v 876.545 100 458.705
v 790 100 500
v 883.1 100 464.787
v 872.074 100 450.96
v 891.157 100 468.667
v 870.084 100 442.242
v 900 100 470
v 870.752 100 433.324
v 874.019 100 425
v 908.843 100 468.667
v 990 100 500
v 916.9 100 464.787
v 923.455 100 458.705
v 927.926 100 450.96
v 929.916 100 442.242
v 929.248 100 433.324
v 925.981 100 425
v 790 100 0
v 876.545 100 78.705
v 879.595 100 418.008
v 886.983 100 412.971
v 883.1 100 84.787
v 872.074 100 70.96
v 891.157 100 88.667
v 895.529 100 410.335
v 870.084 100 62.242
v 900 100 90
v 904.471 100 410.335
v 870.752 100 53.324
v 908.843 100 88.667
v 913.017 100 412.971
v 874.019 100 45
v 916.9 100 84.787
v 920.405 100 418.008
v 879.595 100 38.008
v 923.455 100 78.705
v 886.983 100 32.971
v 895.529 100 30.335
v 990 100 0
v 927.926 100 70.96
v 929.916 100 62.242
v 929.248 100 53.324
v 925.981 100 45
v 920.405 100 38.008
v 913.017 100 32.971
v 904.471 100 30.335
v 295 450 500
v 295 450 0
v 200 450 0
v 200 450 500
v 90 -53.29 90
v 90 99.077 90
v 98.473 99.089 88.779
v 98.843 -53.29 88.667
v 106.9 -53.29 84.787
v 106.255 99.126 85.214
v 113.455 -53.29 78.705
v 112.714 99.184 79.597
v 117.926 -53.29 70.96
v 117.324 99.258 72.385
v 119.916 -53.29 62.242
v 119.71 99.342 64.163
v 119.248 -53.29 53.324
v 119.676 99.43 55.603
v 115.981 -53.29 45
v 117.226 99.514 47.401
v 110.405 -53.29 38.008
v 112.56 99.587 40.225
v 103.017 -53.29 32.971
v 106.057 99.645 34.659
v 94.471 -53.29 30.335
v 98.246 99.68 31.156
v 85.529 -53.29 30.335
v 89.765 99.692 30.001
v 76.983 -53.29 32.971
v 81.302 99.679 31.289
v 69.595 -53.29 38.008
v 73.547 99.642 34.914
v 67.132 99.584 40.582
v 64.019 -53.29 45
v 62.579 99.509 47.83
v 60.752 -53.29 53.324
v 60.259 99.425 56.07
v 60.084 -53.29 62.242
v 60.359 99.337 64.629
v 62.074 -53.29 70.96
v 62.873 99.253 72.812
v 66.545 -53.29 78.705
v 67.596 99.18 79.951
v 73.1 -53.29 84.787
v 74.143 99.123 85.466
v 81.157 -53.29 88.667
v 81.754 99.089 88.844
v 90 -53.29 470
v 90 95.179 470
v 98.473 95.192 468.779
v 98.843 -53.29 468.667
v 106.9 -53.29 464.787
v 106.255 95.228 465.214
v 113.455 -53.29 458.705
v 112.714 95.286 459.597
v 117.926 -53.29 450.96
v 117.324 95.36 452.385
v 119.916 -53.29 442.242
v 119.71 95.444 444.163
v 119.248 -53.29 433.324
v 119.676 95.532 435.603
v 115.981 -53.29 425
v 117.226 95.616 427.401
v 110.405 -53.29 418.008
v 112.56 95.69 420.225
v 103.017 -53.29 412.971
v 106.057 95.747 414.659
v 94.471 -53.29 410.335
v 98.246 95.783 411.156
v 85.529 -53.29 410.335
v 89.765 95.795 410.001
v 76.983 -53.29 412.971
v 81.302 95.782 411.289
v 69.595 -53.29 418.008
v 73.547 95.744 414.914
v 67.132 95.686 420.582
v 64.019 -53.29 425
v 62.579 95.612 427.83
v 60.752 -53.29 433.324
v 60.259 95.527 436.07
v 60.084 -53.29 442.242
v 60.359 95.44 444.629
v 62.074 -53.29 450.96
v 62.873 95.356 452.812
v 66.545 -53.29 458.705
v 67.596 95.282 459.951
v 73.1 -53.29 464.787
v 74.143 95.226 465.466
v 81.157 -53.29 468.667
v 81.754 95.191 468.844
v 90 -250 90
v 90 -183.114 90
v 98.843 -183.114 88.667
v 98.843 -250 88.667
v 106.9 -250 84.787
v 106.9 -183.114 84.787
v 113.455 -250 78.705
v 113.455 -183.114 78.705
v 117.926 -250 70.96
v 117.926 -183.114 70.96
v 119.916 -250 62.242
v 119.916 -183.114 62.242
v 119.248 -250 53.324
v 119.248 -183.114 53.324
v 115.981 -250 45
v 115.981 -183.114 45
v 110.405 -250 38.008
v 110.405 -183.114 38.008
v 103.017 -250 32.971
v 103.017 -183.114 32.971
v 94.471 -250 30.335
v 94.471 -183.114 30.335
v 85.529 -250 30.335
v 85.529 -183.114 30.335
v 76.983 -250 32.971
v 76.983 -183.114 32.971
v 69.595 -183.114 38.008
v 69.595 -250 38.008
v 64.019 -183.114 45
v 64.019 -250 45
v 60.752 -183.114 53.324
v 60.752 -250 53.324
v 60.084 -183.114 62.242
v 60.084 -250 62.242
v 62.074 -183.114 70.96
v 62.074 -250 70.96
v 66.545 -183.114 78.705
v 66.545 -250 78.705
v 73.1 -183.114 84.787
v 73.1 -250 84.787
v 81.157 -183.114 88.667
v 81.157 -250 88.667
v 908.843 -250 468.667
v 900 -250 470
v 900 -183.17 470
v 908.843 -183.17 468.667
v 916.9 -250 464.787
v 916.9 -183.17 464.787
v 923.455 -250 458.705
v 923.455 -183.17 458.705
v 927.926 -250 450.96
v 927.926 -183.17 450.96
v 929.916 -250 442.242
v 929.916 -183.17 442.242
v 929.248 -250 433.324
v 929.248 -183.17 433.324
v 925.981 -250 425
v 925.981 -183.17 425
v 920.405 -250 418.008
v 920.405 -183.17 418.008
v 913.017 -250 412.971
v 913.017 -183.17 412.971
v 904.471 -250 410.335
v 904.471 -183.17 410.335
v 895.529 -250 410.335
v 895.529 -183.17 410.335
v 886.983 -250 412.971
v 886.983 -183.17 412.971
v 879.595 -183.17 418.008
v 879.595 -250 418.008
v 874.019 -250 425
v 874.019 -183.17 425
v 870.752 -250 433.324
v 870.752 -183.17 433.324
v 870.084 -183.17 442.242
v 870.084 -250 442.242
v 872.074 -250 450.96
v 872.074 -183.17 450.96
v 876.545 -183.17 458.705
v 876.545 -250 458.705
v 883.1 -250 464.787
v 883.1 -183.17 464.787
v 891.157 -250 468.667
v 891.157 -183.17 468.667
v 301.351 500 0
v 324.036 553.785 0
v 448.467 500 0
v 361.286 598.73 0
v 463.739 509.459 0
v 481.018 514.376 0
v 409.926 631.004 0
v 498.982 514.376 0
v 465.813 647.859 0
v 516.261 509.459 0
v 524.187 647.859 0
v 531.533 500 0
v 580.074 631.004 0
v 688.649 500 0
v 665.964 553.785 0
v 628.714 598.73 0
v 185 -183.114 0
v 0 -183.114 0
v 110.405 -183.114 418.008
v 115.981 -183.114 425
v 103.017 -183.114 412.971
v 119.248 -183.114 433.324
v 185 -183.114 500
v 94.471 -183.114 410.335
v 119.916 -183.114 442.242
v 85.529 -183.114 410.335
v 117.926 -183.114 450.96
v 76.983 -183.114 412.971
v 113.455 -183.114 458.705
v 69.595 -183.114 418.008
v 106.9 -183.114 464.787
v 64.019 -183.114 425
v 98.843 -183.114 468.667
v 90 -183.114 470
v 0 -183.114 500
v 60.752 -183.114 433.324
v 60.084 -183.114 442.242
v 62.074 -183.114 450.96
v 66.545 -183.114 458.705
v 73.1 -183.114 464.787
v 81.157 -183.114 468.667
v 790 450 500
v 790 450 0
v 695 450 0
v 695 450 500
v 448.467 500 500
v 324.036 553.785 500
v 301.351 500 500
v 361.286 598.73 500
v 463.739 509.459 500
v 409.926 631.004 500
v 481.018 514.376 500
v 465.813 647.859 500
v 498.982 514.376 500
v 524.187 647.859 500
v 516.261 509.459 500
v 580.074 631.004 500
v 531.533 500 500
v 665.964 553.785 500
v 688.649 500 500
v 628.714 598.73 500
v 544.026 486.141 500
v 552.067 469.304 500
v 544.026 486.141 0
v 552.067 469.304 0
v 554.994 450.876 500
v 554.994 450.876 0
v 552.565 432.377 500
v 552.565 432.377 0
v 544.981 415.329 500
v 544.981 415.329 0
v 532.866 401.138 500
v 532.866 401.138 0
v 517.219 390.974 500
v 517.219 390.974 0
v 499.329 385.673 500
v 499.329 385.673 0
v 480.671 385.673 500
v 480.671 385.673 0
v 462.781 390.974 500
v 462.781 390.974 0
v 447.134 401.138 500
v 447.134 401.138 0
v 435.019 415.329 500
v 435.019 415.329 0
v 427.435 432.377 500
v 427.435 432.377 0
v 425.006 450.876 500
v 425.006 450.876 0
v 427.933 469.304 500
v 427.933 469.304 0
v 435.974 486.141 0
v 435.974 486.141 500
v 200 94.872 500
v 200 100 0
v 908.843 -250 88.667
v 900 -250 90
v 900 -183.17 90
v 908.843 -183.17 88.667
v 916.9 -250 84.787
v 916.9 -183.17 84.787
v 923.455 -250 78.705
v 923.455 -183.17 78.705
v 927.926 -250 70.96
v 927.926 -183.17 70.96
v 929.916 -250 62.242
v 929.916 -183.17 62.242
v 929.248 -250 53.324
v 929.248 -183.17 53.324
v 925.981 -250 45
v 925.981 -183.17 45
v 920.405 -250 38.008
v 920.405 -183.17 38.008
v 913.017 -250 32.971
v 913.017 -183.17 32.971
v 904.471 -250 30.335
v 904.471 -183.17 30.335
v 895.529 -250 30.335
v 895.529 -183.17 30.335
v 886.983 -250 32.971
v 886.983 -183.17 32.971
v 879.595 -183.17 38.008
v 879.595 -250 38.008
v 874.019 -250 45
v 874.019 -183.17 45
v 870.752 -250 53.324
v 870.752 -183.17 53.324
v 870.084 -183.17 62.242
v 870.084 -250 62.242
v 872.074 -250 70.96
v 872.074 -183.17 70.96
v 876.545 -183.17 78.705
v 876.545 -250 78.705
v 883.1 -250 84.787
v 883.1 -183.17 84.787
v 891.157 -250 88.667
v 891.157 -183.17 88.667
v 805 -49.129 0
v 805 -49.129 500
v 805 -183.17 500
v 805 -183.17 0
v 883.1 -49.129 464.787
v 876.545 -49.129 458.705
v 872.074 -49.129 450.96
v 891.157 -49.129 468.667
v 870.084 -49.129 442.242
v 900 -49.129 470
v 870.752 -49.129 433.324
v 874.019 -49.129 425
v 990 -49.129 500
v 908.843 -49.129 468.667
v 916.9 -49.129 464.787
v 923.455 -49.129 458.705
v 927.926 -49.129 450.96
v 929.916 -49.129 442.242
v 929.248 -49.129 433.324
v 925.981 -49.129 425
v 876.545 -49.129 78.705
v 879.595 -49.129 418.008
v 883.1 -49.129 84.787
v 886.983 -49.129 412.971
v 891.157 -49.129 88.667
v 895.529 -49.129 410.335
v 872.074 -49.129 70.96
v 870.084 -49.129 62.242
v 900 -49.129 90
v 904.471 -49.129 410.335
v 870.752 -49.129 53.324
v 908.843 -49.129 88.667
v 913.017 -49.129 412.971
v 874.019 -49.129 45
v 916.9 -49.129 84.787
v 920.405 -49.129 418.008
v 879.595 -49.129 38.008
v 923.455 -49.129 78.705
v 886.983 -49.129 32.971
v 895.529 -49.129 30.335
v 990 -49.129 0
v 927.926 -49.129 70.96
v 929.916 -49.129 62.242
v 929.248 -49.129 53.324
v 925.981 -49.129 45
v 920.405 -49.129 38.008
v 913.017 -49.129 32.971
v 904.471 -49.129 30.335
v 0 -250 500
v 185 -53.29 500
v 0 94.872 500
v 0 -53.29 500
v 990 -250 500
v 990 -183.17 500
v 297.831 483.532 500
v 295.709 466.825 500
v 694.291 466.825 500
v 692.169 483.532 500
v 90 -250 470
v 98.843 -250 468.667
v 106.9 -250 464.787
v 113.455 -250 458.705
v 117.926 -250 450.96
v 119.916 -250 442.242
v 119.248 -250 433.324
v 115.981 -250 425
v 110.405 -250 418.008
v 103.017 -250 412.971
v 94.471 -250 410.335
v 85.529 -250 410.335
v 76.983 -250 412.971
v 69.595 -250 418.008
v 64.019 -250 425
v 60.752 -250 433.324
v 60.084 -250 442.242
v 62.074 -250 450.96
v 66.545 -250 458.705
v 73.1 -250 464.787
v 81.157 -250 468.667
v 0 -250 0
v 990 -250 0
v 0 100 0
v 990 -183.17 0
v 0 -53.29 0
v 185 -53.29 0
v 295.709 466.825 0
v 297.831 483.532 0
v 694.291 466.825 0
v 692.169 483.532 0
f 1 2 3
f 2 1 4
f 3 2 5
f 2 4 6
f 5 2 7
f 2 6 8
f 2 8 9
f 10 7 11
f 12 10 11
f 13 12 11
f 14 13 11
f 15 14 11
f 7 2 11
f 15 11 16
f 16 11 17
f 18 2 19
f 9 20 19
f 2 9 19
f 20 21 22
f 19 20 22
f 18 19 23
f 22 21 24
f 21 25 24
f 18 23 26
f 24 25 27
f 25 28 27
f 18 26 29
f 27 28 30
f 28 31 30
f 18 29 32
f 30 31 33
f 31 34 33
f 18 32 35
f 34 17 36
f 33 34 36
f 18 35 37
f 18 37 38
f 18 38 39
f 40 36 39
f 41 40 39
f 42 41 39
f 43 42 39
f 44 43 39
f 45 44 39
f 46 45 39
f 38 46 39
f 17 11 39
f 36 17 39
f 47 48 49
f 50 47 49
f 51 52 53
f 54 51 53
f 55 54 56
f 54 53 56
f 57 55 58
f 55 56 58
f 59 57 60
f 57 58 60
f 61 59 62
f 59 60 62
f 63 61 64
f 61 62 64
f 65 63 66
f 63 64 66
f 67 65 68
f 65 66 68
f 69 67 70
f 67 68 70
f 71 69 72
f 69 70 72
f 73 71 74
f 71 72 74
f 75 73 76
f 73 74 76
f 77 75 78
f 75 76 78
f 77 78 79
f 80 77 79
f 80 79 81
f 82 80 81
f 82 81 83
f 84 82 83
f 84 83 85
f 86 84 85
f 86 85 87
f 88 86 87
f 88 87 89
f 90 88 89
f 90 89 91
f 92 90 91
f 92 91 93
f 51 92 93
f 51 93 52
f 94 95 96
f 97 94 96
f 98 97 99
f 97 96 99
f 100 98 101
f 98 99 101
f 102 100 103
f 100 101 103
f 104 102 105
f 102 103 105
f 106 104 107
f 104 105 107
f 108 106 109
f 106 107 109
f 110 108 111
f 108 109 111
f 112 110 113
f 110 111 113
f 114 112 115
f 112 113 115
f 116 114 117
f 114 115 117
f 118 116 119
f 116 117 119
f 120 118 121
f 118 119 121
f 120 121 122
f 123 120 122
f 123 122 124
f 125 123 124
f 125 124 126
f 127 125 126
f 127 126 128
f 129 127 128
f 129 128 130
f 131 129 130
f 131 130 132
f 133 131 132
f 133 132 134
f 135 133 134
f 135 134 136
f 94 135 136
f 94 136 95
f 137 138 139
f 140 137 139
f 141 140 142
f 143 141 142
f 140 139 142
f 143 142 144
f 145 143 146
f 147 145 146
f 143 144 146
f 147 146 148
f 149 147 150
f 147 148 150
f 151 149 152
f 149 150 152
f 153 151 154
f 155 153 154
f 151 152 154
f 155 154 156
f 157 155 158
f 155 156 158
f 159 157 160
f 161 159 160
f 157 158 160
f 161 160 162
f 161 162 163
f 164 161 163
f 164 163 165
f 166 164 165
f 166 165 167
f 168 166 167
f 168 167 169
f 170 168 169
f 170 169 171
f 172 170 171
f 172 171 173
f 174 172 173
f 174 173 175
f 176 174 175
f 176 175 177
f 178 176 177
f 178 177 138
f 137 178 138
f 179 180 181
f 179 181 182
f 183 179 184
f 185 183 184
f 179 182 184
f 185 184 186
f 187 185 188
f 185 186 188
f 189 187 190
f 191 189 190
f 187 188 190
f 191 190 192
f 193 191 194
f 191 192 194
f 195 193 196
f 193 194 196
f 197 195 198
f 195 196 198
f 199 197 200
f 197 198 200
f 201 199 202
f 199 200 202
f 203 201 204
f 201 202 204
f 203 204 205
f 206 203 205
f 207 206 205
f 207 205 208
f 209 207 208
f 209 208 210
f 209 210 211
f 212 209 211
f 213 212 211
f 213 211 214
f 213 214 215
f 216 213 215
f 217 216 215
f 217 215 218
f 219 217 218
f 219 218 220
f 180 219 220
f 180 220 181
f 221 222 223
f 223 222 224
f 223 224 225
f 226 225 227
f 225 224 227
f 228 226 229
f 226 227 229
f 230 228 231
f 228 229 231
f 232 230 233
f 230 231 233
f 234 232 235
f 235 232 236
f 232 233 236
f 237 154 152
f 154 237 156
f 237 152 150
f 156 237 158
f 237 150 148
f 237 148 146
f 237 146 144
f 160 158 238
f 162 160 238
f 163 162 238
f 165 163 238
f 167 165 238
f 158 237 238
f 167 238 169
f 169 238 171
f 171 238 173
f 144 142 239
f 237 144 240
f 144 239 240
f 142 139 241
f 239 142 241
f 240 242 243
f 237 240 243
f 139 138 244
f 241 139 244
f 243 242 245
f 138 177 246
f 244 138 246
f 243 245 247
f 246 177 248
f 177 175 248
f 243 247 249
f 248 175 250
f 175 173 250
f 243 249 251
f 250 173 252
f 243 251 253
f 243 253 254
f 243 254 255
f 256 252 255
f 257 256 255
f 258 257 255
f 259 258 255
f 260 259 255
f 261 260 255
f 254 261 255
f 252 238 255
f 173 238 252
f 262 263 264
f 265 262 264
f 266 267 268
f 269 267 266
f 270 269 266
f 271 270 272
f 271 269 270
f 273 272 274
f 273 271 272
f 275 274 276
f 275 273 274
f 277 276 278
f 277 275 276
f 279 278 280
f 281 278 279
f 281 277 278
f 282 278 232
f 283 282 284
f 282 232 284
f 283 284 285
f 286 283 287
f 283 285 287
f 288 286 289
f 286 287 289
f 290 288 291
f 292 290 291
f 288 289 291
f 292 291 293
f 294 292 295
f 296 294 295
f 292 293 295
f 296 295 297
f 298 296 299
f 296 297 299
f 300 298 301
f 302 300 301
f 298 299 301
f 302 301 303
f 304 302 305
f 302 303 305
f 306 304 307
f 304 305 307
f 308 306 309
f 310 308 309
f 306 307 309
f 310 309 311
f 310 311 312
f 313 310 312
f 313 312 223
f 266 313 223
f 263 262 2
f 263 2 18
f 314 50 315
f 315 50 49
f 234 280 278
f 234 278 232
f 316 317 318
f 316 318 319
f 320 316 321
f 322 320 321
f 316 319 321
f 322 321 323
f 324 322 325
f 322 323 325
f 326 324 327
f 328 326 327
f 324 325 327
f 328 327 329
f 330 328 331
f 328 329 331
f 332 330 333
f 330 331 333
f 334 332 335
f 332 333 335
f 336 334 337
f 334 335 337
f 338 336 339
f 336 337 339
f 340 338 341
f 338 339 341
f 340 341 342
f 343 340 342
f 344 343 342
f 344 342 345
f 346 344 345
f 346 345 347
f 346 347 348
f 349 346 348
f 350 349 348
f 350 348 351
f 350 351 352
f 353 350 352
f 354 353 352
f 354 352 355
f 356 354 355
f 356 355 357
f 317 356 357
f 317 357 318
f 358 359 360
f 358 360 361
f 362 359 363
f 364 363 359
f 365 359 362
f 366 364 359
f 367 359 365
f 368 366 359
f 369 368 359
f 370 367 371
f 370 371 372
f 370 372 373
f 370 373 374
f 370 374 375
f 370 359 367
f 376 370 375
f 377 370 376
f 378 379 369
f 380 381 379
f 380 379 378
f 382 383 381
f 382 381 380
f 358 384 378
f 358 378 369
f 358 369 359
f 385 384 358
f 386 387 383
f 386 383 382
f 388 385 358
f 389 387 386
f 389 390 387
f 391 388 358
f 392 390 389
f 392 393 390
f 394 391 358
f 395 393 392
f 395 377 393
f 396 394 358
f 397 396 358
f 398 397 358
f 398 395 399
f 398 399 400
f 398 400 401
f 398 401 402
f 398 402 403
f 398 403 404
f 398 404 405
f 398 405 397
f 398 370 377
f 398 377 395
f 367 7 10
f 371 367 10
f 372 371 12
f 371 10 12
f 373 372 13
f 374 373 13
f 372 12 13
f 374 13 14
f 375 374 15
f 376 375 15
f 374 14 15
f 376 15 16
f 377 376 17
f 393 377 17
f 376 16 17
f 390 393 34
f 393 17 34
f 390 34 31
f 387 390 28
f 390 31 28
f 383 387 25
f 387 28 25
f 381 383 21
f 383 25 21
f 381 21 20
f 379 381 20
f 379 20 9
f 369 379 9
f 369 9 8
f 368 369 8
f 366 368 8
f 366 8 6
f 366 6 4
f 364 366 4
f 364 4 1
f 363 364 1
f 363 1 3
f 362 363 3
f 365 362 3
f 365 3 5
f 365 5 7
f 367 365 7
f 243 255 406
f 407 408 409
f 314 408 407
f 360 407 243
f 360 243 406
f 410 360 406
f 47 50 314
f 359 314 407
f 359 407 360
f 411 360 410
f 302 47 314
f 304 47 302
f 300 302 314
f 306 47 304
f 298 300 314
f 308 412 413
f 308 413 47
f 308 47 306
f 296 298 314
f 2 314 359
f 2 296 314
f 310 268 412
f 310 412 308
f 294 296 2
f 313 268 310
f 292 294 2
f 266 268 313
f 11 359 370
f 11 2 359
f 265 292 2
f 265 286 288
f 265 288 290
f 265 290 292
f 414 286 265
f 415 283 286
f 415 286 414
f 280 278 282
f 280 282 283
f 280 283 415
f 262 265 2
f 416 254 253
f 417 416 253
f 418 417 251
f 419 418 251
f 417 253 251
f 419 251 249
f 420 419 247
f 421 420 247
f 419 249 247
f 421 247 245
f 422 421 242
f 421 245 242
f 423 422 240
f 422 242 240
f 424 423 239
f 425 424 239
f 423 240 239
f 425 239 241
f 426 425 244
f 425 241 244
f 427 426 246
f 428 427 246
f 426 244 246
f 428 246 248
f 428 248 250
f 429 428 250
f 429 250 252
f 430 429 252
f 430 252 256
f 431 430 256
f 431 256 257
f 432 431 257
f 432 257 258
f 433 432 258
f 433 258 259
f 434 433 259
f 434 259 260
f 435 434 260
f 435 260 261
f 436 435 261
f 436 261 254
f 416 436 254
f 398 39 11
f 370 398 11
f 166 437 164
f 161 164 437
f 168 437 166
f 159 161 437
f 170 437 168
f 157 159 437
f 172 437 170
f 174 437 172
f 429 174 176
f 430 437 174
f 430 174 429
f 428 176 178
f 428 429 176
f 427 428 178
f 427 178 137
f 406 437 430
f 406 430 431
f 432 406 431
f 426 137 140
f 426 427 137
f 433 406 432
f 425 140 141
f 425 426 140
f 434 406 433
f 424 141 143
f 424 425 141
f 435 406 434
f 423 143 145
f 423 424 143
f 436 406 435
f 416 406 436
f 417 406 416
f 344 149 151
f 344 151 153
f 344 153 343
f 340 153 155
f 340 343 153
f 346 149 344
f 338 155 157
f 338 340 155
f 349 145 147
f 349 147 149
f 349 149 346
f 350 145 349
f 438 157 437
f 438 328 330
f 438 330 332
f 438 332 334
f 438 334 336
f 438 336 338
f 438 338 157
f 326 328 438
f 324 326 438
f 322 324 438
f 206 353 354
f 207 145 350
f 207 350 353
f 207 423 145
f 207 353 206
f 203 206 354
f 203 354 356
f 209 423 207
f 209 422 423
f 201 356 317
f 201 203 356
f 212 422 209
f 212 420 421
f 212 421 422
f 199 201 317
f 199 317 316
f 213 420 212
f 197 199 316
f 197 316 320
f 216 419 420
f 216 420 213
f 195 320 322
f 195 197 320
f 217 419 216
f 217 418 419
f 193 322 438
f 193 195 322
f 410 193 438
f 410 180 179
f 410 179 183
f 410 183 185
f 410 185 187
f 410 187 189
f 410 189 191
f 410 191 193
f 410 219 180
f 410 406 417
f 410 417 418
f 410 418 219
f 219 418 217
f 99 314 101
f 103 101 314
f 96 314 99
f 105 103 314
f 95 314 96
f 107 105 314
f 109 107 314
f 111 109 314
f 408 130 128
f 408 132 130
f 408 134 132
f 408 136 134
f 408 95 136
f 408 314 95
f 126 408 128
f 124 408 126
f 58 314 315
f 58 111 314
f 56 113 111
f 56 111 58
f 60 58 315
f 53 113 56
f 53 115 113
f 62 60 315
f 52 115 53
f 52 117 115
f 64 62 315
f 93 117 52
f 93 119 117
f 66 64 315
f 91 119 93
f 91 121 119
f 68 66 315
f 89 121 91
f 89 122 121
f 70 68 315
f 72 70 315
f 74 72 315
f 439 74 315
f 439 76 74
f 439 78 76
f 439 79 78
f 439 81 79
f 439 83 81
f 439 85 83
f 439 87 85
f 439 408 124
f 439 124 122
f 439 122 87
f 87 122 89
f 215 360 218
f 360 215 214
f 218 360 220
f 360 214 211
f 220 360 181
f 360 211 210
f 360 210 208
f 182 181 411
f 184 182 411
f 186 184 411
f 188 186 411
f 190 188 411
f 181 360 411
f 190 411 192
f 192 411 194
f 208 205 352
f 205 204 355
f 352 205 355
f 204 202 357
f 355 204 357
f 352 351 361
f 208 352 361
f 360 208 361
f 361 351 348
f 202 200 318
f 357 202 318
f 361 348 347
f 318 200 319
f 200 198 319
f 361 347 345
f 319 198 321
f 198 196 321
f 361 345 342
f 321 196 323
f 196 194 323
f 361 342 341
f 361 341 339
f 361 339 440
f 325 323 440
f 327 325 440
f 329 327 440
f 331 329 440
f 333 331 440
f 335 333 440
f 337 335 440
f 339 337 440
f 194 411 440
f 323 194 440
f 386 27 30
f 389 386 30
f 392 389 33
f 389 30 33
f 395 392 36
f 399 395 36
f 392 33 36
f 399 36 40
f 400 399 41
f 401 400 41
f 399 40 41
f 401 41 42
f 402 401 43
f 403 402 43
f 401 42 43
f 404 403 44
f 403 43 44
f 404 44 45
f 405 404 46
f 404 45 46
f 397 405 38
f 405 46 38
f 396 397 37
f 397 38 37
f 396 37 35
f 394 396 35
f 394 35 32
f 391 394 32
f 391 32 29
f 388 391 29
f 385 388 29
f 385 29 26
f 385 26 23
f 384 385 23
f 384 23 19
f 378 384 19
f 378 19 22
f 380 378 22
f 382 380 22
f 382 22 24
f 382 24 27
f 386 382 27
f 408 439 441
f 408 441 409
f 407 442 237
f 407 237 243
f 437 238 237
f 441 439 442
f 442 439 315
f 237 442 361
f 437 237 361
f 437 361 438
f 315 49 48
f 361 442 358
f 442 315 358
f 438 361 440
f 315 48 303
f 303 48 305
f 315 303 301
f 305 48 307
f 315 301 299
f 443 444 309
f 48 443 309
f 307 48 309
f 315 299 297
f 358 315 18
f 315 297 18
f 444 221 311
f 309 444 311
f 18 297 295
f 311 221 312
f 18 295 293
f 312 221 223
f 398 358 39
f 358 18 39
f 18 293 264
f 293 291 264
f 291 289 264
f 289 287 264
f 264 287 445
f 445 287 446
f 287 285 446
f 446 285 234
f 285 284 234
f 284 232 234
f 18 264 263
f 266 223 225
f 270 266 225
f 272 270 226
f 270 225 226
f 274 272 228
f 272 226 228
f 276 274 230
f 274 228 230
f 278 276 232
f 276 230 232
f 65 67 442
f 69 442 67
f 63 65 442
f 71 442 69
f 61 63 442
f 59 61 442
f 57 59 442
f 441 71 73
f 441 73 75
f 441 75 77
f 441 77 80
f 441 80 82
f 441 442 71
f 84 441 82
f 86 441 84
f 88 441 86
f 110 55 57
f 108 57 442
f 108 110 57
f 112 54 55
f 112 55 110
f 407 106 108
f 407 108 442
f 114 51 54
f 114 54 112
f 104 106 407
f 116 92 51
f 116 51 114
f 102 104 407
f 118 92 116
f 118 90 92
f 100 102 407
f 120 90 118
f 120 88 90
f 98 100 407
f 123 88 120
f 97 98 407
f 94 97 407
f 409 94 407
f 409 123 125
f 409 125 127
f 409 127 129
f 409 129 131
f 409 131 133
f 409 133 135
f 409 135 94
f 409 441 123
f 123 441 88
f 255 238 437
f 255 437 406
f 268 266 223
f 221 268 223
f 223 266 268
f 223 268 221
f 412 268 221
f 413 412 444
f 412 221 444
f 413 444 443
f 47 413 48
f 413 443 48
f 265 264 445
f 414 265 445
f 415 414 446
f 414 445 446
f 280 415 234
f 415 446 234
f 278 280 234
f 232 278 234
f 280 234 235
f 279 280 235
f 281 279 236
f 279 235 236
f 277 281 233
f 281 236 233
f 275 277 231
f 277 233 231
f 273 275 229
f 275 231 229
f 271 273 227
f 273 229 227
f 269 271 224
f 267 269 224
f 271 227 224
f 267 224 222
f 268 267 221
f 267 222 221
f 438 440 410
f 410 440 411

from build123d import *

# Parameters (mm, degrees)
BOSS_EXTRU_1_DEPTH       = 500
ESQUISSE2_W              = 990
ESQUISSE2_H              = 500
BOSS_EXTRU_2_DEPTH       = 250
ENL_V_MAT_EXTRU_6_DEPTH  = 200
ESQUISSE15_W             = 500
ESQUISSE15_H             = 350
ENL_V_MAT_EXTRU_7_DEPTH  = 200
ESQUISSE16_W             = 500
ESQUISSE16_H             = 134.041314403
ENL_V_MAT_EXTRU_8_DEPTH  = 185
ESQUISSE17_W             = 500
ESQUISSE17_H             = 129.824071981
ENL_V_MAT_EXTRU_9_DEPTH  = 185
ESQUISSE18_R             = 30
ENL_V_MAT_EXTRU_10_DEPTH = 450
ESQUISSE19_R             = 65
ENL_V_MAT_EXTRU_11_DEPTH = 500


with BuildPart() as part:
    # Esquisse1 → Boss.-Extru.1 (new body)
    with BuildSketch(Plane.XY):
        with BuildLine():
            Line((0, 0), (990, 0))
            Line((990, 0), (990, 450))
            Line((990, 450), (695, 450))
            ThreePointArc((695, 450), (495, 650), (295, 450))
            Line((295, 450), (0, 450))
            Line((0, 450), (0, 0))
        make_face()
    extrude(amount=BOSS_EXTRU_1_DEPTH)

    # Esquisse2 → Boss.-Extru.2 (add)
    with BuildSketch(Plane.XZ):
        with Locations((495, 250)):
            Rectangle(ESQUISSE2_W, ESQUISSE2_H)
    extrude(amount=BOSS_EXTRU_2_DEPTH)


with BuildPart() as body_2:
    # Fractionner2: the piece on the far side of the plane
    add(part.part)
    split(bisect_by=Plane(origin=(0, 500, 0), x_dir=(0, 0, -1), z_dir=(0, -1, 0)), keep=Keep.BOTTOM)


with BuildPart() as part_1:
    add(part.part)

    # Fractionner2
    split(bisect_by=Plane(origin=(0, 500, 0), x_dir=(0, 0, -1), z_dir=(0, -1, 0)), keep=Keep.TOP)

    # Esquisse14 → Enlèv. mat.-Extru.6 (cut)
    with BuildSketch(Plane.ZY):
        Polygon((500, 94.871649535), (0, 100), (0, 450), (500, 450), align=None)
    extrude(amount=-ENL_V_MAT_EXTRU_6_DEPTH, mode=Mode.SUBTRACT)

    # Esquisse15 → Enlèv. mat.-Extru.7 (cut)
    with BuildSketch(Plane(origin=(990, 0, 0), x_dir=(0, 0, -1), z_dir=(1, 0, 0))):
        with Locations((-250, 275)):
            Rectangle(ESQUISSE15_W, ESQUISSE15_H)
    extrude(amount=-ENL_V_MAT_EXTRU_7_DEPTH, mode=Mode.SUBTRACT)

    # Esquisse16 → Enlèv. mat.-Extru.8 (cut)
    with BuildSketch(Plane(origin=(990, 0, 0), x_dir=(0, 0, -1), z_dir=(1, 0, 0))):
        with Locations((-250, -116.14971871)):
            Rectangle(ESQUISSE16_W, ESQUISSE16_H)
    extrude(amount=-ENL_V_MAT_EXTRU_8_DEPTH, mode=Mode.SUBTRACT)

    # Esquisse17 → Enlèv. mat.-Extru.9 (cut)
    with BuildSketch(Plane.ZY):
        with Locations((250, -118.202021533)):
            Rectangle(ESQUISSE17_W, ESQUISSE17_H)
    extrude(amount=-ENL_V_MAT_EXTRU_9_DEPTH, mode=Mode.SUBTRACT)

    # Esquisse18 → Enlèv. mat.-Extru.10 (cut)
    with BuildSketch(Plane(origin=(0, 100, 0), x_dir=(1, 0, 0), z_dir=(0, 1, 0))):
        with Locations(Location((900, -440, 0), (0, 0, 270))):
            Circle(ESQUISSE18_R)
        with Locations(Location((900, -60, 0), (0, 0, 270))):
            Circle(ESQUISSE18_R)
        with Locations(Location((90, -440, 0), (0, 0, 270))):
            Circle(ESQUISSE18_R)
        with Locations(Location((90, -60, 0), (0, 0, 270))):
            Circle(ESQUISSE18_R)
    extrude(amount=-ENL_V_MAT_EXTRU_10_DEPTH, mode=Mode.SUBTRACT)


with BuildPart() as enl_v_mat_extru_11_tool:
    # Esquisse19 → Enlèv. mat.-Extru.11 (new body)
    with BuildSketch(Plane(origin=(0, 0, 0), x_dir=(-1, 0, 0), z_dir=(0, 0, -1))):
        with Locations((-490, 450)):
            Circle(ESQUISSE19_R)
    extrude(amount=-ENL_V_MAT_EXTRU_11_DEPTH)


with BuildPart() as part_2:
    add(part_1.part)

    # Enlèv. mat.-Extru.11: cut by enl_v_mat_extru_11_tool
    add(enl_v_mat_extru_11_tool.part, mode=Mode.SUBTRACT)


with BuildPart() as body_2_1:
    add(body_2.part)

    # Enlèv. mat.-Extru.11: cut by enl_v_mat_extru_11_tool
    add(enl_v_mat_extru_11_tool.part, mode=Mode.SUBTRACT)


solid = Compound([part_2.part, body_2_1.part])
